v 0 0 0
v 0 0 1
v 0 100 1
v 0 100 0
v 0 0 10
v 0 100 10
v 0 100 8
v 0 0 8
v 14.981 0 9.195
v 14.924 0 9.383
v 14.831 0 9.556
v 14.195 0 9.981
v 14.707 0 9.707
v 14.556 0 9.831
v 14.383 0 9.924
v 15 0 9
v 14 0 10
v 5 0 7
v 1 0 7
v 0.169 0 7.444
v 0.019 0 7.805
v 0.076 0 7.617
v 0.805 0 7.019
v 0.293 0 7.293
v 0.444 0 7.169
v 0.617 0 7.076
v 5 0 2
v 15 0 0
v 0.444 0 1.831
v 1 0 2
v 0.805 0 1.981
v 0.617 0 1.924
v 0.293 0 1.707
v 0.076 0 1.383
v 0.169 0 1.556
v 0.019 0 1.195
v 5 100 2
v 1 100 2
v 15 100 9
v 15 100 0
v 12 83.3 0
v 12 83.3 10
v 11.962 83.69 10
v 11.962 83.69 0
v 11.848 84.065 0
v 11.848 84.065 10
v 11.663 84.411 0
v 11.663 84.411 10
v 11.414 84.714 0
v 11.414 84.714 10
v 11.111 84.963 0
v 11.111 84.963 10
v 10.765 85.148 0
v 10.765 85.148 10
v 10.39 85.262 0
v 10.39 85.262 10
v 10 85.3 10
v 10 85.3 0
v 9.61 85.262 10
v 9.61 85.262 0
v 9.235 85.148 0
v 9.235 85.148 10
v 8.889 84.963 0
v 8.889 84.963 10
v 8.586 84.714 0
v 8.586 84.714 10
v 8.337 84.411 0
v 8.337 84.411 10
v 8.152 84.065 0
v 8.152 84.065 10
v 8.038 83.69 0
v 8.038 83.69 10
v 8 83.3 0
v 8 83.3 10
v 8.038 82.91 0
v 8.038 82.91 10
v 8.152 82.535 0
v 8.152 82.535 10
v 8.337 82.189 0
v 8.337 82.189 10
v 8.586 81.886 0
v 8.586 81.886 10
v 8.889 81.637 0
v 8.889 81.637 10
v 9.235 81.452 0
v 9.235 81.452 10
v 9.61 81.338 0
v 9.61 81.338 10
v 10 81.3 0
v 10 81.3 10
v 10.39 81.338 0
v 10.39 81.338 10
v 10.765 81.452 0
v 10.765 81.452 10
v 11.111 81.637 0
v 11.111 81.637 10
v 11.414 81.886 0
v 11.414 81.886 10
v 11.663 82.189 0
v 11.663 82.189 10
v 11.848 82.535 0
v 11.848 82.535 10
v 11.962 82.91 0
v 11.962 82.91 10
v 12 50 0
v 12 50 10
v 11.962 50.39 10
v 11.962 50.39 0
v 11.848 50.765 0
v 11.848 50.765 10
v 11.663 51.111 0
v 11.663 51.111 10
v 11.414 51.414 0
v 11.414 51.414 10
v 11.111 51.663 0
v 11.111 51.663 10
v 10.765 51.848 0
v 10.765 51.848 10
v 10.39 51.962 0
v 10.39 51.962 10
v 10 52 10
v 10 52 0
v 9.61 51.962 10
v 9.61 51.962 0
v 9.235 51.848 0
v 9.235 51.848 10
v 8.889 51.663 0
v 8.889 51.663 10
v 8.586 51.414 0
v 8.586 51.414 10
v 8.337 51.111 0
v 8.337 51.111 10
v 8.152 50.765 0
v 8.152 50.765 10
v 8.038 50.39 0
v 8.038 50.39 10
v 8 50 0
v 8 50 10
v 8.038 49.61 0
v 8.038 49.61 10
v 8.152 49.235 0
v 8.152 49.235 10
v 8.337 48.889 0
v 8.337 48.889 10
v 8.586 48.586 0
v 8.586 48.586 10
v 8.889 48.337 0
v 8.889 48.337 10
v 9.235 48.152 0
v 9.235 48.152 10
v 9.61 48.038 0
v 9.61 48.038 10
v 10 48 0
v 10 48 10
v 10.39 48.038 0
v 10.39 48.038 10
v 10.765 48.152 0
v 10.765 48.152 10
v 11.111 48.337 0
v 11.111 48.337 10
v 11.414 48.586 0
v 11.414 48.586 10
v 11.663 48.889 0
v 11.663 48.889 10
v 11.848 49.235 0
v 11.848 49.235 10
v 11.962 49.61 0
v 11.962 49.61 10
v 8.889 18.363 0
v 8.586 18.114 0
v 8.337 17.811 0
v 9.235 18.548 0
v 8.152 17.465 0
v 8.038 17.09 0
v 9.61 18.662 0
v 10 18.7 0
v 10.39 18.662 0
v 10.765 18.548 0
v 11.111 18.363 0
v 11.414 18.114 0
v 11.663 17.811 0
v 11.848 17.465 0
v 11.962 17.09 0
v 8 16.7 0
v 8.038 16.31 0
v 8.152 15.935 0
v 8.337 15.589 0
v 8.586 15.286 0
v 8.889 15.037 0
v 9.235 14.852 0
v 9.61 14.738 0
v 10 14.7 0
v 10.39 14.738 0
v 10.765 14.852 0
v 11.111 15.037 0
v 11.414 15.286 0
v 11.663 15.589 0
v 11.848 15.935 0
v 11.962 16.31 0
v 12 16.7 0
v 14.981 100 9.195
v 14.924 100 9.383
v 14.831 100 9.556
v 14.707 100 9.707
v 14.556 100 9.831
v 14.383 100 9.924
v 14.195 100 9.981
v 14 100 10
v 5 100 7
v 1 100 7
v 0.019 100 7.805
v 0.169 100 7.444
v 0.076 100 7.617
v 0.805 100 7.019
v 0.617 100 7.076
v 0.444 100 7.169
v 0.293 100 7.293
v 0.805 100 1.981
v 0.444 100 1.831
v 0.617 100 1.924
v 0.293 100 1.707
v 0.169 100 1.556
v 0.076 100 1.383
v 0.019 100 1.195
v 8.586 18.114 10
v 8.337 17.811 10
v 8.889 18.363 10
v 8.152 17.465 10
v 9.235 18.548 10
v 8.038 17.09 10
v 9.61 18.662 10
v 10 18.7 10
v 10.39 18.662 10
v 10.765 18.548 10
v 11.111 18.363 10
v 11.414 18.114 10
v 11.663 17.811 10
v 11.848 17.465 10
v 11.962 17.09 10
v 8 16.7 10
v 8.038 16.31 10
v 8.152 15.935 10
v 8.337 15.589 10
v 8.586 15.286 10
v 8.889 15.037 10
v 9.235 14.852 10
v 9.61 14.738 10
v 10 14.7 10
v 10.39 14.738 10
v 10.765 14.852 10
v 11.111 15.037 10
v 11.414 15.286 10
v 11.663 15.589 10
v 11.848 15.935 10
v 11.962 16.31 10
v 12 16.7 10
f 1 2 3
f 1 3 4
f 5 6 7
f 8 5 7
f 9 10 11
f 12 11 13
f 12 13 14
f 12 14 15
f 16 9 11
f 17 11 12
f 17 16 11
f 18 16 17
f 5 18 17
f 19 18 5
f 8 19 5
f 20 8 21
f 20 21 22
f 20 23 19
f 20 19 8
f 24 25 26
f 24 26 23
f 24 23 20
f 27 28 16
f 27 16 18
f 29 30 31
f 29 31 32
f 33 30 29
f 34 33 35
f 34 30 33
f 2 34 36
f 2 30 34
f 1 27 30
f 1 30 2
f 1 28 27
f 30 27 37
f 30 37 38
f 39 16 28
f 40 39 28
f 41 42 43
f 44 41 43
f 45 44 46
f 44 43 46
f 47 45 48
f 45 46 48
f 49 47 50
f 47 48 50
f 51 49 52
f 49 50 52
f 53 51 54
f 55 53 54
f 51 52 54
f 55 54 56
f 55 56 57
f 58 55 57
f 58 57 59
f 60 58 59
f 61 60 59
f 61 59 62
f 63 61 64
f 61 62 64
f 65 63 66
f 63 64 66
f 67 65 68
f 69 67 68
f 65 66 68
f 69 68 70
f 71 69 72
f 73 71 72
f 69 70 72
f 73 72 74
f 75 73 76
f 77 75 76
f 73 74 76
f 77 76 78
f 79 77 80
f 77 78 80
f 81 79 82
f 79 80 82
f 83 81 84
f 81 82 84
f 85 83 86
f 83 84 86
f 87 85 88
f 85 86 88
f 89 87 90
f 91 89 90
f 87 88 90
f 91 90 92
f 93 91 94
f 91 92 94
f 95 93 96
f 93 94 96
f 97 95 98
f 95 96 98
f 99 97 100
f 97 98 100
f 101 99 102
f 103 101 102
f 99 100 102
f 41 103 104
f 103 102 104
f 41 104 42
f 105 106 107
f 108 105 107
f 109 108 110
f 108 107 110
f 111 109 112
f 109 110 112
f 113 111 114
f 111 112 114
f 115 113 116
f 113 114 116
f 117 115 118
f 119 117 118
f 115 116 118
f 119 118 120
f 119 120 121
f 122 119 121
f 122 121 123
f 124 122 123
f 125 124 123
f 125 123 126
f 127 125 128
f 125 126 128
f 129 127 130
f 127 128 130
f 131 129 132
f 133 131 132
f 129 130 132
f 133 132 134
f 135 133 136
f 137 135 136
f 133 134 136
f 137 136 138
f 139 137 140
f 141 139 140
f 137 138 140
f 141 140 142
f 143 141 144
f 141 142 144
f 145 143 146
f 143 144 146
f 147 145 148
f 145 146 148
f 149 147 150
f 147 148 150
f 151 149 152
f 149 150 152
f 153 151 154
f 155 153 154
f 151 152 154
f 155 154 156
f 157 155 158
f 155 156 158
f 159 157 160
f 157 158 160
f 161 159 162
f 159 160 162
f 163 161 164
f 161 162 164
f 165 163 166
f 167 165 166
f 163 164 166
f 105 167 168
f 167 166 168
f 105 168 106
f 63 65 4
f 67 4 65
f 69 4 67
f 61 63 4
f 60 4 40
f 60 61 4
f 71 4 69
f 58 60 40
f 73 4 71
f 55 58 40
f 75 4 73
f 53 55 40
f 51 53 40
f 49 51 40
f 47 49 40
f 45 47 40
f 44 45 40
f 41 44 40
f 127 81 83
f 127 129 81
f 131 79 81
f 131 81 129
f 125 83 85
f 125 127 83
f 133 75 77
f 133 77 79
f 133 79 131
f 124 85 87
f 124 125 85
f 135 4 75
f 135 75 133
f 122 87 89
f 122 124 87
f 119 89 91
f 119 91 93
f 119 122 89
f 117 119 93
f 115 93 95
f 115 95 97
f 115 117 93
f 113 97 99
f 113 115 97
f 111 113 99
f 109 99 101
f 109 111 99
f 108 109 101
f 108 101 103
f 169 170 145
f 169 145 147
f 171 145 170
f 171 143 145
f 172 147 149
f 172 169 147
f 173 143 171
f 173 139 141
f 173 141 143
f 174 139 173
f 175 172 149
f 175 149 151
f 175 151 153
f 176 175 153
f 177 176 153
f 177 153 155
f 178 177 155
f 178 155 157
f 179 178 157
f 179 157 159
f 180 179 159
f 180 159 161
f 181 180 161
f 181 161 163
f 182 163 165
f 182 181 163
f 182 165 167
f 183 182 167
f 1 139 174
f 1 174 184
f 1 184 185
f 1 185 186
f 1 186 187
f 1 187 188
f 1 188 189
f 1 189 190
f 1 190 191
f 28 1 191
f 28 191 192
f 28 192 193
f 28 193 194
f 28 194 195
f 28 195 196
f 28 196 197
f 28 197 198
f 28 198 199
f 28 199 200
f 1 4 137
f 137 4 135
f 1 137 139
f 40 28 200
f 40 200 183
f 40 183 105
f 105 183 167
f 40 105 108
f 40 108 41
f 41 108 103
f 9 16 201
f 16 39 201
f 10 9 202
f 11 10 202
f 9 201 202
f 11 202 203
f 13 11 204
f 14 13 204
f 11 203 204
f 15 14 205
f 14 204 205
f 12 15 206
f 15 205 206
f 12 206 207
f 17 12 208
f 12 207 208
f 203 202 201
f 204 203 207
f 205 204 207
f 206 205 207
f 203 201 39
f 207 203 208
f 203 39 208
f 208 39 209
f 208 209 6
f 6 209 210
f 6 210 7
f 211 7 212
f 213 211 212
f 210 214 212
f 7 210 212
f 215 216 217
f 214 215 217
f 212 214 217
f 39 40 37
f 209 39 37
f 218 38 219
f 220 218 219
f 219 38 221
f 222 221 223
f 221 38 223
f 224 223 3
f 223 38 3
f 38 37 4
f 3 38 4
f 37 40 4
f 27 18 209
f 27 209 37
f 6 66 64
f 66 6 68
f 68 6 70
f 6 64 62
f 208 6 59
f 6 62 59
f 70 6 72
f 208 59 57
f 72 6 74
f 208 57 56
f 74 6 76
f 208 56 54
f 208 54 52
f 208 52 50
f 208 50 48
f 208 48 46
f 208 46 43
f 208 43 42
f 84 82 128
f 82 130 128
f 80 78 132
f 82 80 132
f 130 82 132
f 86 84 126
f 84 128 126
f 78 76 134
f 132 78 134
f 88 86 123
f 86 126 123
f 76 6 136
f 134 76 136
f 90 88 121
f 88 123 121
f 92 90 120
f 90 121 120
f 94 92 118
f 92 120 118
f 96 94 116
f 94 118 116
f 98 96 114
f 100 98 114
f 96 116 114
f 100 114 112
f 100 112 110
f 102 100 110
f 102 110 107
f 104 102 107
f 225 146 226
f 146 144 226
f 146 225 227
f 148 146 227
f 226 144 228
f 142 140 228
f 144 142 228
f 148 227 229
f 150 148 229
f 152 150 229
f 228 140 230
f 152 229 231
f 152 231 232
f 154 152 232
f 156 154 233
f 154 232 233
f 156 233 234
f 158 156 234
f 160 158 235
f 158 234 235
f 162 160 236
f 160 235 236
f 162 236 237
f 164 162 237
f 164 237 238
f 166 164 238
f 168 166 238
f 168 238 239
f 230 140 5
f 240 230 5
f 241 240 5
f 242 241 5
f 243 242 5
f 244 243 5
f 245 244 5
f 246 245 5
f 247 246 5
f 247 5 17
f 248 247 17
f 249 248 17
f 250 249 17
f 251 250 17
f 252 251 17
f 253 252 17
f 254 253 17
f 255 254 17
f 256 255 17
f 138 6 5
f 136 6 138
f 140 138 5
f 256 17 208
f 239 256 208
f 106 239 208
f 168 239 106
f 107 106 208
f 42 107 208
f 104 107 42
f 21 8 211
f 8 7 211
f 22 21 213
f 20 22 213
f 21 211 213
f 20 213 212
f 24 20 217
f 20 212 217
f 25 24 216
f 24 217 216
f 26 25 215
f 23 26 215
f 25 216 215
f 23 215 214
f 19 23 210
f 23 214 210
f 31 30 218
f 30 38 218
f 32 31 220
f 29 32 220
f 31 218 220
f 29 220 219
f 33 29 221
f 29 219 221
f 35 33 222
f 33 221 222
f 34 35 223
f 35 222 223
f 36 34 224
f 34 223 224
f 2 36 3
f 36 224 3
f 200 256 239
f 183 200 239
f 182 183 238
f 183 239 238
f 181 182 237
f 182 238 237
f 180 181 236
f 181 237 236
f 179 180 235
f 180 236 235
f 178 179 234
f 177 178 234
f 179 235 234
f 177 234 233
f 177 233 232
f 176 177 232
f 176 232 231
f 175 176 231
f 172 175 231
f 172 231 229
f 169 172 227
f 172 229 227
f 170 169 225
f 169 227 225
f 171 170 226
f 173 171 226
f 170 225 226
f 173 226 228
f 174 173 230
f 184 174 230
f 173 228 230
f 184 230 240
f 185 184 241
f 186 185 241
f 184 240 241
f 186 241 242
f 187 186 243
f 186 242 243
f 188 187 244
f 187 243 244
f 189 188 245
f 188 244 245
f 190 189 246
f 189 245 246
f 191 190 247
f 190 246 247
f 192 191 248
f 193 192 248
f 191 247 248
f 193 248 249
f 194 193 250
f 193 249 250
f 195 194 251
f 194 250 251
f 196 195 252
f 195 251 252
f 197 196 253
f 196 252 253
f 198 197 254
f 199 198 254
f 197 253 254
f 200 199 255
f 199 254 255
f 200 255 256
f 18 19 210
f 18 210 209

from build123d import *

# Parameters (mm, degrees)
BOSS_EXTRUDE1_DEPTH = 100
FILLET1_R           = 1
SKETCH2_R           = 2
CUT_EXTRUDE1_DEPTH  = 10


with BuildPart() as part:
    # Sketch1 → Boss-Extrude1 (new body)
    with BuildSketch(Plane(origin=(0, 0, 0), x_dir=(1, 0, 0), z_dir=(0, 1, 0))):
        Polygon((0, 0), (15, 0), (15, -2), (15, -10), (7, -10), (0, -10), (0, -7), (5, -7), (5, -2), (0, -2), align=None)
    extrude(amount=BOSS_EXTRUDE1_DEPTH)

    # Fillet1
    fillet1_edges = [part.edges().sort_by_distance(p)[0] for p in [
        (15, 50, 10),
        (0, 50, 7),
        (0, 50, 2),
    ]]
    fillet(fillet1_edges, radius=FILLET1_R)

    # Sketch2 → Cut-Extrude1 (cut)
    with BuildSketch(Plane.XY.offset(10)):
        with Locations((10, 16.7)):
            Circle(SKETCH2_R)
        with Locations((10, 83.3)):
            Circle(SKETCH2_R)
        with Locations((10, 50)):
            Circle(SKETCH2_R)
    extrude(amount=-CUT_EXTRUDE1_DEPTH, mode=Mode.SUBTRACT)


solid = part.part
